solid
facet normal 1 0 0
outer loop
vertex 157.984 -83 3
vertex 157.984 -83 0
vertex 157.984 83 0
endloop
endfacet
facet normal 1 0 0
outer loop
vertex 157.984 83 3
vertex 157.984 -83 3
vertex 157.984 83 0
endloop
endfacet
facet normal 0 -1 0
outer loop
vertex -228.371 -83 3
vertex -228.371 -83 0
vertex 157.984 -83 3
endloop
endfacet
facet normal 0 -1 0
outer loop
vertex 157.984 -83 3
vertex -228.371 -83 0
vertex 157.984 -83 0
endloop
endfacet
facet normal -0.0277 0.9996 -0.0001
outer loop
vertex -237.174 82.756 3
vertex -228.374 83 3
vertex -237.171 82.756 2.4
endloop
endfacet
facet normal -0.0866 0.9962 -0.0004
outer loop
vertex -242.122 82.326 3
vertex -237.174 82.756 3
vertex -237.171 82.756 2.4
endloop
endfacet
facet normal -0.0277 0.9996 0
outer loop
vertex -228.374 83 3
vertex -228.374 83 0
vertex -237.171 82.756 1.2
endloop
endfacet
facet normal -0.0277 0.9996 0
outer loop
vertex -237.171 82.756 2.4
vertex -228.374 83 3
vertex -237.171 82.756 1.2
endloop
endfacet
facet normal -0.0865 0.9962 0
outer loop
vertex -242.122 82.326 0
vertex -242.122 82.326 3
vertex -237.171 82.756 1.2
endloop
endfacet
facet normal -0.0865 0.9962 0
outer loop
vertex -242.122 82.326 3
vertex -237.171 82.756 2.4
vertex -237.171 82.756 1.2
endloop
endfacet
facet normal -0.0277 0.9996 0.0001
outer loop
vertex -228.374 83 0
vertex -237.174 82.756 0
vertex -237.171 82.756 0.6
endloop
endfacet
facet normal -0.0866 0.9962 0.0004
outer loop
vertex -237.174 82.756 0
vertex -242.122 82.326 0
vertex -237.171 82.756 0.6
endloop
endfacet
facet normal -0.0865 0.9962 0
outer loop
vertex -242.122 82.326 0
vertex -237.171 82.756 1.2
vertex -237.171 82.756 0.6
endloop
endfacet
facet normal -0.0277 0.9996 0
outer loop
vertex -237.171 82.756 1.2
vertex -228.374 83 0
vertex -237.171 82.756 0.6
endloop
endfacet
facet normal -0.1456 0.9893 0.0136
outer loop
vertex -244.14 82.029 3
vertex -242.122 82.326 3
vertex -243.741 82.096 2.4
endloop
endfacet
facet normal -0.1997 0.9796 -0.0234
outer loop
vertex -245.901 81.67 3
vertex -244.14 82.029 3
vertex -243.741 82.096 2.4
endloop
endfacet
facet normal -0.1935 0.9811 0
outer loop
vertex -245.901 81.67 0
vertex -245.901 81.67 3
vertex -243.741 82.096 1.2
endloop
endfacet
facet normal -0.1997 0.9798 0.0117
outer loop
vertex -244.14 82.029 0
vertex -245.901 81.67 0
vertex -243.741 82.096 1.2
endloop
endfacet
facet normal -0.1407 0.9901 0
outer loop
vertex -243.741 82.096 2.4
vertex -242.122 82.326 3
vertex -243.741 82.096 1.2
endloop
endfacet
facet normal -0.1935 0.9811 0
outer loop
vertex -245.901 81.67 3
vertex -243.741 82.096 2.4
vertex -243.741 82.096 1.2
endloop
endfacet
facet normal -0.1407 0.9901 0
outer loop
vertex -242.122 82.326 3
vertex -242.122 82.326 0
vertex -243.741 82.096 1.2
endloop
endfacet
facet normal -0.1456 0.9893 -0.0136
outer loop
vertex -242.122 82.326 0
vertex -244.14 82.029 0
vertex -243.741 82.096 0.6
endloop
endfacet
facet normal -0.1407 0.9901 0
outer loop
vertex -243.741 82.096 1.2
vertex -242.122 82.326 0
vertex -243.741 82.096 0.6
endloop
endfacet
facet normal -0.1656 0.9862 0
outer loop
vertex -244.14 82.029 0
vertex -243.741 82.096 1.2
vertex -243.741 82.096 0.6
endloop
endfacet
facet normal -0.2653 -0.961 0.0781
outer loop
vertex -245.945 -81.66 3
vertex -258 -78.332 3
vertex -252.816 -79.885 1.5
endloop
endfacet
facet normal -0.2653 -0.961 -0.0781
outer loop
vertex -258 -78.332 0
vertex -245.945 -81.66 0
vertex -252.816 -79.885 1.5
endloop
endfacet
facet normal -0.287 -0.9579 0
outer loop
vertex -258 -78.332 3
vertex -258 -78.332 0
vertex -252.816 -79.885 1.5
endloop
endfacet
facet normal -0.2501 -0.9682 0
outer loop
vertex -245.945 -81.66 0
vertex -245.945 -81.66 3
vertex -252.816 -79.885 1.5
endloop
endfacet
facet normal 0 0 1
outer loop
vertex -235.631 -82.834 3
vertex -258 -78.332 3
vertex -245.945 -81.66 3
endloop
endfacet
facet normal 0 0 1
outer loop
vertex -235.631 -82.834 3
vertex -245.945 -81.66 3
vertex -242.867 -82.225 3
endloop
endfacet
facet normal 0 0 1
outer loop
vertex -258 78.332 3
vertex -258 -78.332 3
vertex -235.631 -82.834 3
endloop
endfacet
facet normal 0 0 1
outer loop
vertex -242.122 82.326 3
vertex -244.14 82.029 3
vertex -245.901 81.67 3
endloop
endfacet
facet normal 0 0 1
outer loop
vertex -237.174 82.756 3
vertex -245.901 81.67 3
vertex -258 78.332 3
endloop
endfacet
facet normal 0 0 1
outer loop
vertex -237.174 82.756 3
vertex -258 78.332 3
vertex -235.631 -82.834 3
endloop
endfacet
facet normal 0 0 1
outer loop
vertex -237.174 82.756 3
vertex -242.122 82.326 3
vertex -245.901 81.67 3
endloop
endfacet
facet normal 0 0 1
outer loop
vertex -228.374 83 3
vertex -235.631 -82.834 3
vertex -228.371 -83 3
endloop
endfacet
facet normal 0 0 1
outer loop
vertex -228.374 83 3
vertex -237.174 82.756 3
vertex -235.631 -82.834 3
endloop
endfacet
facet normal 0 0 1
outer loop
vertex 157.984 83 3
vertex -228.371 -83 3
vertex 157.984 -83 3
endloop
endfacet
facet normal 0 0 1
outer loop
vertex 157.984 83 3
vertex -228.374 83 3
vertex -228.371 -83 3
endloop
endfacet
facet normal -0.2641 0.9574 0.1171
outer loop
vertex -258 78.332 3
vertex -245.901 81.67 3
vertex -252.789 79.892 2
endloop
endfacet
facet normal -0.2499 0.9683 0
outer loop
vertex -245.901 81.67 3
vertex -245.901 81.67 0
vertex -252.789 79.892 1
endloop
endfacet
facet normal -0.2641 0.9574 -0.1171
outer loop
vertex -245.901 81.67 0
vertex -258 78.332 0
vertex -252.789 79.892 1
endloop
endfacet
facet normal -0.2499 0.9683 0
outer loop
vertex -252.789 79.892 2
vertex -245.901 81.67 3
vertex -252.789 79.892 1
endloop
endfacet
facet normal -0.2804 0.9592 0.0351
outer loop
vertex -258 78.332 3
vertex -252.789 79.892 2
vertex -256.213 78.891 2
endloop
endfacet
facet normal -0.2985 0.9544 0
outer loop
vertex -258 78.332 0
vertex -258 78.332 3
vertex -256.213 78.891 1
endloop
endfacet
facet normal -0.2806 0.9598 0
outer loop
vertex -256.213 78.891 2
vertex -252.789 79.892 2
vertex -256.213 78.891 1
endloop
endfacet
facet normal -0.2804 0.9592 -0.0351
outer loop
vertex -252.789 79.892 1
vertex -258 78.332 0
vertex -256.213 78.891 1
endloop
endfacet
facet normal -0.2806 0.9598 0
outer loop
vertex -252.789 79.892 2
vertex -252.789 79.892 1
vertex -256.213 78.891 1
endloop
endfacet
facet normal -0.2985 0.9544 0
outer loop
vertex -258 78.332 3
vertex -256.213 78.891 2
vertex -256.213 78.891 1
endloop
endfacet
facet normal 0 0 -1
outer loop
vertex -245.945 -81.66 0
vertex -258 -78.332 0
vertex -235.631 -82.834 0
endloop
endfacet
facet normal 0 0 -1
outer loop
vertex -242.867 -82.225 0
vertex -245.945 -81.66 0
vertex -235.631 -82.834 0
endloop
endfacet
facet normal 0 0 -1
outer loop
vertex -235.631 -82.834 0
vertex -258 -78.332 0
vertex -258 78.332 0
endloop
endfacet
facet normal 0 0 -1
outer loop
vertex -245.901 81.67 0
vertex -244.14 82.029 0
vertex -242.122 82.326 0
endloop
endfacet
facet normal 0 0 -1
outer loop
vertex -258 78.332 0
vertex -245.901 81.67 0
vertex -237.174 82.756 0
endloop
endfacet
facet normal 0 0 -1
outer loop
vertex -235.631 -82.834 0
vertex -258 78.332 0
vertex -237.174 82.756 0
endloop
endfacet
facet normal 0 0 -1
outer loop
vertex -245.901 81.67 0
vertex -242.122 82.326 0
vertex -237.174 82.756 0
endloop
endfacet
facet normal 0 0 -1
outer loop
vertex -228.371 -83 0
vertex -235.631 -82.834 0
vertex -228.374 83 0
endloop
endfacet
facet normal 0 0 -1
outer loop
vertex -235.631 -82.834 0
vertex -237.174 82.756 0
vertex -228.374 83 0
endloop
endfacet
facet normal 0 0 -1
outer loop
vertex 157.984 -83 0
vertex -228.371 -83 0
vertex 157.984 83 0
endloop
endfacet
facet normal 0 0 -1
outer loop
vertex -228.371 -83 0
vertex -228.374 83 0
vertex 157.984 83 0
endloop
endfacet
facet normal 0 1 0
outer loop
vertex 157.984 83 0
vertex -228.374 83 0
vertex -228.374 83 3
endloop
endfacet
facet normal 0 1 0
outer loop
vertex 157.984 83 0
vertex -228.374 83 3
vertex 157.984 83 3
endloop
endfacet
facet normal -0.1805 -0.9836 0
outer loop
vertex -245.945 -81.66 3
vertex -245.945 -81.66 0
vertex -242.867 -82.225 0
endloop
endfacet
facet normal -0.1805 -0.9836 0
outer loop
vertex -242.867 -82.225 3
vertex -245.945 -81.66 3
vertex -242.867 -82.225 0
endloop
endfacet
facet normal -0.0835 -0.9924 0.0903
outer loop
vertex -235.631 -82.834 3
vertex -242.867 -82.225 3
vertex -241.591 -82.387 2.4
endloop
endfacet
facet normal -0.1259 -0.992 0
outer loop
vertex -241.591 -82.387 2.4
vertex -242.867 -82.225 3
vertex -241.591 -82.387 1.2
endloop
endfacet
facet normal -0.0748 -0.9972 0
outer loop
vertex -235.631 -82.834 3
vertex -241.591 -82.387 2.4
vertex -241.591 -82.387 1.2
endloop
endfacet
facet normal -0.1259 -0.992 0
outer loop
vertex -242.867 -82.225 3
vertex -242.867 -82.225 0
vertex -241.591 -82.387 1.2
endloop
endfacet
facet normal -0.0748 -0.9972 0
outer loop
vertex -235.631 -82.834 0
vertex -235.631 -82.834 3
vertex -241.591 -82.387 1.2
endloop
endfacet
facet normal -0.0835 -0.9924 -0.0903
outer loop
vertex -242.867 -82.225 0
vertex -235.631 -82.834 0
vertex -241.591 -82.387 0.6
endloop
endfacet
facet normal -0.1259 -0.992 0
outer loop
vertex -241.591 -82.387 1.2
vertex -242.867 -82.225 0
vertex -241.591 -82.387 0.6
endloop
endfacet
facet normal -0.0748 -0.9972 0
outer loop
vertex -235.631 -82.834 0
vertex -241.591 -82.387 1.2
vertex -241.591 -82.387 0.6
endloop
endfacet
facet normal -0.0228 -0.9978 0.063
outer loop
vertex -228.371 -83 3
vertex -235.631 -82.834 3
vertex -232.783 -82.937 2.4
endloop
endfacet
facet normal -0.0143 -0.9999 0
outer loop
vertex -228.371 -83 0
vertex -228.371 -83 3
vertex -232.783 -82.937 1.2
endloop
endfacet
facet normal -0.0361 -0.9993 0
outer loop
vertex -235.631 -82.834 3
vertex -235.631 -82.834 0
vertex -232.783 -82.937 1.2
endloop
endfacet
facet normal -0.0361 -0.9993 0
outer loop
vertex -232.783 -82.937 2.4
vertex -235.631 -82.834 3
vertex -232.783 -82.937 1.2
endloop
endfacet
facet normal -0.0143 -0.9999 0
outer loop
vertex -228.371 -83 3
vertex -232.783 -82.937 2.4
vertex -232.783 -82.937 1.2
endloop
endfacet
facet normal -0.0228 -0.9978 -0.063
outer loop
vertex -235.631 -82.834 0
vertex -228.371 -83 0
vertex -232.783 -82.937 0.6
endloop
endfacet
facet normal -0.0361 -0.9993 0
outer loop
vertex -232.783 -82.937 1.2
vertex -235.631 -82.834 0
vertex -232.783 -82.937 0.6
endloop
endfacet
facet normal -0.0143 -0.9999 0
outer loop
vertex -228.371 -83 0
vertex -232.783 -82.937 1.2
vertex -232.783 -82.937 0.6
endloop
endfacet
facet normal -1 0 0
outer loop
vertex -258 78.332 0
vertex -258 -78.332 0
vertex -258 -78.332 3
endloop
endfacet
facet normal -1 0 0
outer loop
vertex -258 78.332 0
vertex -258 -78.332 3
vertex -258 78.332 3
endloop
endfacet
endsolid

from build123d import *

# Parameters (mm, degrees)
SKETCH1_W                   = 416
SKETCH1_H                   = 166
BOSS_EXTRUDE1_DEPTH         = 3
CUT_EXTRUDE_THIN3_OUTLINE_W = 0.015995157
CUT_EXTRUDE_THIN3_OUTLINE_H = 166
CUT_EXTRUDE_THIN3_DEPTH     = 3


# Read off the part's stored shape, not the designer's step: Cut-Extrude-Thin3
with BuildPart() as part:
    # Sketch1 → Boss-Extrude1 (new body)
    with BuildSketch(Plane.XY):
        with Locations((-50, 0)):
            Rectangle(SKETCH1_W, SKETCH1_H)
    extrude(amount=BOSS_EXTRUDE1_DEPTH)

    # Cut-Extrude-Thin3 outline → Cut-Extrude-Thin3 (cut)
    with BuildSketch(Plane.XY):
        with BuildLine():
            add(Edge.make_bspline(
                [(-245.900726071, 81.670126669), (-248.205217512, 81.122650851), (-250.502051759, 80.533244416), (-253.933177983, 79.571844696), (-255.074519046, 79.238452038), (-256.809467384, 78.708399189), (-257.40527654, 78.522165432), (-258, 78.331788106)],
                knots=[-1.118e-06, -1.118e-06, -1.118e-06, -1.118e-06, 0.125, 0.125, 0.1875, 0.1875, 0.220226879, 0.220226879, 0.220226879, 0.220226879], degree=3))
            add(Edge.make_bspline(
                [(-228.373898498, 82.999999879), (-229.840089175, 82.999940695), (-231.305822798, 82.978130365), (-234.23846503, 82.898798217), (-235.705718536, 82.841217903), (-238.636271152, 82.67124962), (-240.100674412, 82.559518263), (-242.288562974, 82.310467536), (-243.016587256, 82.213409792), (-244.465500098, 81.977984668), (-245.186104013, 81.839884091), (-245.900726071, 81.670126669)],
                knots=[0.000327866, 0.000327866, 0.000327866, 0.000327866, 0.25, 0.25, 0.5, 0.5, 0.75, 0.75, 0.875, 0.875, 1, 1, 1, 1], degree=3))
            Line((-228.373898498, 82.999999879), (-258, 83))
            Line((-258, 83), (-258, 78.331788106))
        make_face()
        with BuildLine():
            add(Edge.make_bspline(
                [(-258.00000599, -78.331863791), (-256.278252152, -78.883088593), (-254.549713484, -79.39880324), (-250.534508221, -80.524590275), (-248.243697449, -81.112973045), (-245.944918928, -81.659654554)],
                knots=[0.779967806, 0.779967806, 0.779967806, 0.779967806, 0.875, 0.875, 1, 1, 1, 1], degree=3))
            Line((-258.00000599, -78.331863791), (-258, -83))
            Line((-258, -83), (-228.371279881, -83))
            add(Edge.make_bspline(
                [(-245.944918928, -81.659654554), (-245.228204163, -81.83008772), (-244.504823749, -81.968976927), (-243.051197688, -82.205725268), (-242.321772562, -82.303279617), (-240.128214471, -82.554030513), (-238.659345658, -82.66691784), (-235.722483002, -82.838682109), (-234.252964152, -82.897051002), (-231.31301555, -82.977668647), (-229.842588562, -82.999987305), (-228.371279881, -83)],
                knots=[-4.074e-06, -4.074e-06, -4.074e-06, -4.074e-06, 0.125, 0.125, 0.25, 0.25, 0.5, 0.5, 0.75, 0.75, 0.999912213, 0.999912213, 0.999912213, 0.999912213], degree=3))
        make_face()
        with Locations((157.992002421, 0)):
            Rectangle(CUT_EXTRUDE_THIN3_OUTLINE_W, CUT_EXTRUDE_THIN3_OUTLINE_H)
    extrude(amount=CUT_EXTRUDE_THIN3_DEPTH, mode=Mode.SUBTRACT)


solid = part.part
